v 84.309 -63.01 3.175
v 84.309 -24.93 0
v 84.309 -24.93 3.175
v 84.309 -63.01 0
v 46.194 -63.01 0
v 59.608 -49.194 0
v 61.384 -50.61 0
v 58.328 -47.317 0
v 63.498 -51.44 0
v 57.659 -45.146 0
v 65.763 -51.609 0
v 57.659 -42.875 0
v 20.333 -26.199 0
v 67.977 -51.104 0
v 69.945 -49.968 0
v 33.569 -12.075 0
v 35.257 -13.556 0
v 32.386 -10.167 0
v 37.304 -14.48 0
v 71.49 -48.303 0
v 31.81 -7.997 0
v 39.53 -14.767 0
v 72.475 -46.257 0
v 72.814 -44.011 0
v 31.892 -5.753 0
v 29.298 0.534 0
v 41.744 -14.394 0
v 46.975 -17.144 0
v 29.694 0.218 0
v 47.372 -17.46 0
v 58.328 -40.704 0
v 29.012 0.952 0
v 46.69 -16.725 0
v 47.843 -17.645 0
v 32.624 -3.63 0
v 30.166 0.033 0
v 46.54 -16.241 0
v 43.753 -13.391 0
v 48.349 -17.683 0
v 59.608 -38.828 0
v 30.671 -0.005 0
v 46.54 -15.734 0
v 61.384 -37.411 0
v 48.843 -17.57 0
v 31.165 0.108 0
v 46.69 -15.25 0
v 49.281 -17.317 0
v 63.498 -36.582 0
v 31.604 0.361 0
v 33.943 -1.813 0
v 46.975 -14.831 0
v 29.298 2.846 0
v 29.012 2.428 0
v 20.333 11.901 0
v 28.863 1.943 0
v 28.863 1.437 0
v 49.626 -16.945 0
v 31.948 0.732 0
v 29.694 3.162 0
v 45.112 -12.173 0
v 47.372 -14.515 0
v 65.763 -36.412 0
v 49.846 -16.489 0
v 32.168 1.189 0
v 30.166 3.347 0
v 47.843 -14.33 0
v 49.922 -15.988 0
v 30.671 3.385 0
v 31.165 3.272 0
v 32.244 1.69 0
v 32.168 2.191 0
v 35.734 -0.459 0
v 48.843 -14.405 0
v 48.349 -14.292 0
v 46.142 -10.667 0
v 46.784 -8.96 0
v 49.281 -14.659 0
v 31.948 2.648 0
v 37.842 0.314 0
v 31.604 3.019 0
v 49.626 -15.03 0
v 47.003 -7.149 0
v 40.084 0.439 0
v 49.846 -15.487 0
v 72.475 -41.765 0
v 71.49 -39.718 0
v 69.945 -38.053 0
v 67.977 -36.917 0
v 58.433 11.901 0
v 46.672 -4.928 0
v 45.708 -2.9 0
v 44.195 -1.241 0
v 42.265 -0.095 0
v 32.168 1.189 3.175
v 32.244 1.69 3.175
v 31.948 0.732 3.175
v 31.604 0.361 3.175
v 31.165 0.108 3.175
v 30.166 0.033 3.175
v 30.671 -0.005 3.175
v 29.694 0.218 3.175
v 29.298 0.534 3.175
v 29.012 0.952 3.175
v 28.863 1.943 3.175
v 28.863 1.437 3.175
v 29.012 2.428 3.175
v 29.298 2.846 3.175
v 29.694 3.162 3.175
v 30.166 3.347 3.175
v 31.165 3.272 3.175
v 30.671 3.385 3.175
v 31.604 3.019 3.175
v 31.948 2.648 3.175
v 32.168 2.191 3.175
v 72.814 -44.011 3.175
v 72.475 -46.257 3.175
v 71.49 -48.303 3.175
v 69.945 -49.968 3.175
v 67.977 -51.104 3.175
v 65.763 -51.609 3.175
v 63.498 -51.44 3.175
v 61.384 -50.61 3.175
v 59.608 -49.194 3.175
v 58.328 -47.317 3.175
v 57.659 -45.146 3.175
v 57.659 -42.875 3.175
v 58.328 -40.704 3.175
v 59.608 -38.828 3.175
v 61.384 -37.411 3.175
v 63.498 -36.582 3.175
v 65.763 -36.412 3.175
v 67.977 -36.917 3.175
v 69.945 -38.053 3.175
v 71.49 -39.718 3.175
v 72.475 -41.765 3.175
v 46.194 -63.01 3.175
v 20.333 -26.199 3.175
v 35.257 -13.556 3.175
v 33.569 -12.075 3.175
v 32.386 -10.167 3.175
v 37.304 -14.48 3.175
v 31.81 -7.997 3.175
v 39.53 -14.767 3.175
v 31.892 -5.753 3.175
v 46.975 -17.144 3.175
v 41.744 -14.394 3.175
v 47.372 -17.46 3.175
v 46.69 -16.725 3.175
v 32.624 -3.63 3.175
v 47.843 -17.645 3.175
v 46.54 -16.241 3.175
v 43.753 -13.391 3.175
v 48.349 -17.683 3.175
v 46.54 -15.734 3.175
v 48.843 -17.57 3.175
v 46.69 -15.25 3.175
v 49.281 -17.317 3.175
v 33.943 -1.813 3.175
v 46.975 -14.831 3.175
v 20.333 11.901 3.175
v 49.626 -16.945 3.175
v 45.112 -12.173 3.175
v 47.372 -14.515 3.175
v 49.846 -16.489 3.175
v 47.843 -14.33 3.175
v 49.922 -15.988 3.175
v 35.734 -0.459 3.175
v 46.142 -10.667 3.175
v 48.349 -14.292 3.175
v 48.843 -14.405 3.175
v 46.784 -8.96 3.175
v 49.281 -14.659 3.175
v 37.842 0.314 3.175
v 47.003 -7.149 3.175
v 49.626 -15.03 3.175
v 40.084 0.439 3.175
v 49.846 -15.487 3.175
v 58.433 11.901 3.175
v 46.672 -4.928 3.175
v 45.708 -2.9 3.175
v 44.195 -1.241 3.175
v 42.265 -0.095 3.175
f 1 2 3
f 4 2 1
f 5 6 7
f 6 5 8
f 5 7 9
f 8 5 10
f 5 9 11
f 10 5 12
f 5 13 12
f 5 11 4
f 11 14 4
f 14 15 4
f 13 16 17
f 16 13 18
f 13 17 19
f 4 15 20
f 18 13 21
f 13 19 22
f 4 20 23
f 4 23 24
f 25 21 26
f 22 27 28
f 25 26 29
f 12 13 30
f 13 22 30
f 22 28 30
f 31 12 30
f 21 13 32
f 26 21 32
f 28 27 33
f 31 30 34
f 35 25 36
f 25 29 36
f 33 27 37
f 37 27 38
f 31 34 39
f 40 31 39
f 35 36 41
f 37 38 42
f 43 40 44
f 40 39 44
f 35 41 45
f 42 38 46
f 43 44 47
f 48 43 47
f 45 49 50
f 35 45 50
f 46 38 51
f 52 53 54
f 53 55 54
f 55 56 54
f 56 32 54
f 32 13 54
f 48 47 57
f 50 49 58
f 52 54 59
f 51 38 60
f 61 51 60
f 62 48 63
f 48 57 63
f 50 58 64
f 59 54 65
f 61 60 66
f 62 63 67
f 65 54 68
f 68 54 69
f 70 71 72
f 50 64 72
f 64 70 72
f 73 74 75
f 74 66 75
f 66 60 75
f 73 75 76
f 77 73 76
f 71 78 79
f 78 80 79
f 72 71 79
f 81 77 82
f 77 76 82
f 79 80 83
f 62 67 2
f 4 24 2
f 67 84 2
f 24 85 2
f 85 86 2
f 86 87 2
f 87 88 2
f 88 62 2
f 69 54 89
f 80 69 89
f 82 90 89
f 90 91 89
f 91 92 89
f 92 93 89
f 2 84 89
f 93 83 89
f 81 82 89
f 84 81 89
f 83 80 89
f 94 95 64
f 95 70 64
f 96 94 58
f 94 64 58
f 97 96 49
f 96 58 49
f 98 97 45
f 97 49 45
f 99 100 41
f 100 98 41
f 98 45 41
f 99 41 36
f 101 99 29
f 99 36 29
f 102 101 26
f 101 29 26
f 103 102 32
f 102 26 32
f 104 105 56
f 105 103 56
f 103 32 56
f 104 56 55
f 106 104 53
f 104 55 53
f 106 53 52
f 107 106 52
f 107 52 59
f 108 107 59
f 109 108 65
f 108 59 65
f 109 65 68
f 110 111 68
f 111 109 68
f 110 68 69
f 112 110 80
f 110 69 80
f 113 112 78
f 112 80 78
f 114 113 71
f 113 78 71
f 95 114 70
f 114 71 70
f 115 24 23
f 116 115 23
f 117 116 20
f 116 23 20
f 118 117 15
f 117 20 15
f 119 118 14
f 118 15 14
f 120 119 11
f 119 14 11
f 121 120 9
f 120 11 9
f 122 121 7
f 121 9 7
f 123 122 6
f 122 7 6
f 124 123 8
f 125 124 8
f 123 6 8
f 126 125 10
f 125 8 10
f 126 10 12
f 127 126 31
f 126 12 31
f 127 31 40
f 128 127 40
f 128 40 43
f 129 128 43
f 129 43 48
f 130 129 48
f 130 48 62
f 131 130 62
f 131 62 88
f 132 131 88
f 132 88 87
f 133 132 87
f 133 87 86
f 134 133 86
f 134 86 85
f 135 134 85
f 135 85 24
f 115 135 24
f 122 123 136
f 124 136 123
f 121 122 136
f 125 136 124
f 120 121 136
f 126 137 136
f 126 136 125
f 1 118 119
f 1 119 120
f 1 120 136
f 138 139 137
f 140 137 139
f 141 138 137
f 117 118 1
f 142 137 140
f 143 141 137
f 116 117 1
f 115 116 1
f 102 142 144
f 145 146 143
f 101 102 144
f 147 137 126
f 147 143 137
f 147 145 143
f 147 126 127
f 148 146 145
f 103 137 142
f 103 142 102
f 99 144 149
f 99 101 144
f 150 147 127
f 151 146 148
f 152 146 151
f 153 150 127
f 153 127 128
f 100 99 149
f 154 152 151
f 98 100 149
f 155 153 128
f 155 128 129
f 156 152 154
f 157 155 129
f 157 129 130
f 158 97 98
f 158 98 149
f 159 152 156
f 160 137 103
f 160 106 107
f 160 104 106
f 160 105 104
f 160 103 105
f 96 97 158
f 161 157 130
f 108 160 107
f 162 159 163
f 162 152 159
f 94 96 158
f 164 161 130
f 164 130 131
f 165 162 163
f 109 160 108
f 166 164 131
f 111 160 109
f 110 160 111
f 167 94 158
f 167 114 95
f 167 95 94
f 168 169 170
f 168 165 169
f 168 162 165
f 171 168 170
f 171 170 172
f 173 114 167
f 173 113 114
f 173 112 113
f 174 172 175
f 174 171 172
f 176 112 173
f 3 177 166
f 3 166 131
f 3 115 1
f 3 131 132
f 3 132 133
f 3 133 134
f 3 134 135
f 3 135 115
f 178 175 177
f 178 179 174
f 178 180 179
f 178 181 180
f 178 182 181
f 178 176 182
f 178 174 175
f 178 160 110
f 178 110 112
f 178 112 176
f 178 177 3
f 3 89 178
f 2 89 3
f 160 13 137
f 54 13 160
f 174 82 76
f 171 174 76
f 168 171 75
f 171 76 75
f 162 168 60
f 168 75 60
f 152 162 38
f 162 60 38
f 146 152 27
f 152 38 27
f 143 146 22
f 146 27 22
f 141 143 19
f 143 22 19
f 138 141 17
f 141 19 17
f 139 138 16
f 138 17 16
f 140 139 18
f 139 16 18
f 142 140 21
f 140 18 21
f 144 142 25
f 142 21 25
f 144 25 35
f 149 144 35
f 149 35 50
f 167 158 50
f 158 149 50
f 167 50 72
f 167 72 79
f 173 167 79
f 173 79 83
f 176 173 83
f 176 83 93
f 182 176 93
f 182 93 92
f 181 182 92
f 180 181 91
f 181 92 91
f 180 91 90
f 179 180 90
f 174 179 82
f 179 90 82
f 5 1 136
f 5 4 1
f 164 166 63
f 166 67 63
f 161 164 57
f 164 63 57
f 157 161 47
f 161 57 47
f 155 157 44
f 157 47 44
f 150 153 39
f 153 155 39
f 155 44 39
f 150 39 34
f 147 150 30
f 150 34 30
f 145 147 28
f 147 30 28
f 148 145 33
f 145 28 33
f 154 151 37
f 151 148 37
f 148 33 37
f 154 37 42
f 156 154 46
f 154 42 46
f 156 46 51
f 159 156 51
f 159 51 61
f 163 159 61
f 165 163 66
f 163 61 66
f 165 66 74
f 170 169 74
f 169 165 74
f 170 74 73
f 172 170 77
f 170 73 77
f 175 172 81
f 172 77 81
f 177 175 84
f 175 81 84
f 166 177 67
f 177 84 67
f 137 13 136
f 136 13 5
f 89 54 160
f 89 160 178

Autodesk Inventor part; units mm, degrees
ref_plane "YZ Plane" through (0, 0, 0) normal (1, 0, 0) x (0, 1, 0)
ref_plane "XZ Plane" through (0, 0, 0) normal (0, 1, 0) x (-1, 0, 0)
ref_plane "XY Plane" through (0, 0, 0) normal (0, 0, 1) x (1, 0, 0)
sketch "Sketch1" plane through (0, 0, 0) normal (0, 0, 1) x (1, 0, 0)
  circle A0 centre (30.5438, 1.69) radius 1.7
  circle A1 centre (48.2215, -15.9877) radius 1.7
  line L0 (20.3327, -25.9449) -> (20.3327, 11.6471) projected
  circle A2 centre (39.3827, -7.1489) radius 7.62
  line L1 (39.3827, -7.1489) -> (121.2052, -7.1489) construction
  line L2 (20.3327, 11.9011) -> (58.4327, 11.9011)
  line L3 (39.3827, -7.1489) -> (118.6167, -7.1489) construction
  circle A3 centre (65.1936, -44.0106) radius 7.62
  line L4 (20.3327, 11.9011) -> (90.1827, 11.9011)
  line L5 (90.1827, 11.9011) -> (90.1827, -64.2989)
  line L6 (90.1827, -64.2989) -> (20.3327, -64.2989)
  line L7 (20.3327, -64.2989) -> (20.3327, 11.9011)
  circle A4 centre (65.1936, -44.0106) radius 18.9992
  line L8 (39.3827, -7.1489) -> (98.3795, -91.4051)
  line L9 (39.3827, -7.1489) -> (142.2405, -7.1489) construction
  line L10 (77.3997, -64.2989) -> (39.3827, -64.2989)
  line L11 (20.5867, 11.9011) -> (58.1787, 11.9011) projected
  line L12 (84.3087, -63.0098) -> (46.1944, -63.0098)
  line L13 (84.3087, -24.9302) -> (84.3087, -63.0098)
  line L14 (20.3327, -26.1989) -> (46.1944, -63.0098)
  line L15 (58.4327, 11.9011) -> (84.3087, -24.9302)
  point P0 (0, 0)
  dimension "d3" = 15.24
  dimension "d14" = 10.2112
  dimension "d17" = 27.8888
  dimension "d36" = 38.1
  dimension "d42" = 15.24
  dimension "d43" = 44.9999
  dimension "d51" = 69.85
  dimension "d52" = 76.2
  dimension "d53" = 37.9984
  dimension "d54" = 55
  dimension "d55" = 0
  dimension "d56" = 19.05
  dimension "d57" = 19.05
  dimension "d58" = 0
extrude "Extrusion6" add sketch "Sketch1" along normal blind 3.175 contours L0 L7 L2 L15 L13 L12 L8 A4 L14 | A4 L8 A3 | A4 L8 L12 | A4 L8 A3
equation "\"d57\" = d56"
properties part number "Motor and gearbox panel"
